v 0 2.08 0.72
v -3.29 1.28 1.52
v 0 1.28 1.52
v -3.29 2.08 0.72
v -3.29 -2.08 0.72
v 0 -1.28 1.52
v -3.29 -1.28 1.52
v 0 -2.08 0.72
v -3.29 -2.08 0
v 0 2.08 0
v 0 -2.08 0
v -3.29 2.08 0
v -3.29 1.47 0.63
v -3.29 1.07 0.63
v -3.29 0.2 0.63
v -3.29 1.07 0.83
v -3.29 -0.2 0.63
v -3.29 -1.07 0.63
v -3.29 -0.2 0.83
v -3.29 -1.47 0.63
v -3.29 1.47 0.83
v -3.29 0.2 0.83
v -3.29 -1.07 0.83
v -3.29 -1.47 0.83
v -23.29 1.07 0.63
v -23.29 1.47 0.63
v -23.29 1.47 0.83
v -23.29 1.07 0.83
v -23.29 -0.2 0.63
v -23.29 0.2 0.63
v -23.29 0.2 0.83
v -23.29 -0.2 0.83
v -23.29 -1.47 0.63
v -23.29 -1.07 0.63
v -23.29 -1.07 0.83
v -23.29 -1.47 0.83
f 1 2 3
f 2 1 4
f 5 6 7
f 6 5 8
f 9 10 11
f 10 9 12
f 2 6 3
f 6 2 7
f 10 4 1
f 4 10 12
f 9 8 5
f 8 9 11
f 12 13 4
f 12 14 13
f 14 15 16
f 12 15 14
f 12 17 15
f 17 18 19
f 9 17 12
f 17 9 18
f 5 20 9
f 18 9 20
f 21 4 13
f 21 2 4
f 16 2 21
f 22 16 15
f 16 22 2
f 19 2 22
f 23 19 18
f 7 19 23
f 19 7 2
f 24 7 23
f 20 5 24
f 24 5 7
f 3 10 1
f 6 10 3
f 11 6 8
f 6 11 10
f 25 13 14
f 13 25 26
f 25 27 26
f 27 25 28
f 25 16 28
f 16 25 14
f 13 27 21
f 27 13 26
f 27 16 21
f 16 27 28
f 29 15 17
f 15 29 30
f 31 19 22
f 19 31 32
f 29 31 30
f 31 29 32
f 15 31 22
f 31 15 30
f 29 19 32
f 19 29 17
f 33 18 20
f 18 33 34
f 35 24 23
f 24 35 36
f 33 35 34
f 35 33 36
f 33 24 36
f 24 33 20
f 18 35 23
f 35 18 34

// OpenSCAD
//############################################################################## 
//                          Odometer Body
//############################################################################## 
// 
// Odometer for the toy car Tamiya TT-02. The odometer can be mounted at the
// differential output shaft.
//
// This part is the Hall Sensor itself.
//

// Dimensions of "Infineon TLE 4905L"
body_l = 3.29;
body_w = 4.16;
body_h = 1.52;

bevel_w = 0.8;
bevel_h = 0.8;

wire_l = 20;
wire_w = 0.4;
wire_h = 0.2;
wire_pos_h = body_h - 0.79;
wire_dist = 1.27;

module HallSensor() {
    // Wire
    module Wire() {
        color("LightSteelBlue")
        translate([0, -wire_w/2, -wire_h/2])
        rotate([0, -90, 0])
        cube(size=[wire_h, wire_w, wire_l]);
    }

    // Body of the Hall Sensor
    color("Gray")
    rotate([0, -90, 0])
    linear_extrude(height=body_l)
    polygon(points=[
        [ 0                ,  body_w/2           ],
        [ body_h - bevel_h ,  body_w/2           ],
        [ body_h           ,  body_w/2 - bevel_w ],
        [ body_h           , -body_w/2 + bevel_w ],
        [ body_h - bevel_h , -body_w/2           ],
        [ 0                , -body_w/2           ],
    ]);

    // Create and place the wires
    translate([-body_l, wire_dist, wire_pos_h])
    Wire();
    translate([-body_l, 0, wire_pos_h])
    Wire();
    translate([-body_l, -wire_dist, wire_pos_h])
    Wire();
}

function HallSensor_body_l() = body_l;
function HallSensor_body_w() = body_w;
function HallSensor_body_h() = body_h;

HallSensor();
